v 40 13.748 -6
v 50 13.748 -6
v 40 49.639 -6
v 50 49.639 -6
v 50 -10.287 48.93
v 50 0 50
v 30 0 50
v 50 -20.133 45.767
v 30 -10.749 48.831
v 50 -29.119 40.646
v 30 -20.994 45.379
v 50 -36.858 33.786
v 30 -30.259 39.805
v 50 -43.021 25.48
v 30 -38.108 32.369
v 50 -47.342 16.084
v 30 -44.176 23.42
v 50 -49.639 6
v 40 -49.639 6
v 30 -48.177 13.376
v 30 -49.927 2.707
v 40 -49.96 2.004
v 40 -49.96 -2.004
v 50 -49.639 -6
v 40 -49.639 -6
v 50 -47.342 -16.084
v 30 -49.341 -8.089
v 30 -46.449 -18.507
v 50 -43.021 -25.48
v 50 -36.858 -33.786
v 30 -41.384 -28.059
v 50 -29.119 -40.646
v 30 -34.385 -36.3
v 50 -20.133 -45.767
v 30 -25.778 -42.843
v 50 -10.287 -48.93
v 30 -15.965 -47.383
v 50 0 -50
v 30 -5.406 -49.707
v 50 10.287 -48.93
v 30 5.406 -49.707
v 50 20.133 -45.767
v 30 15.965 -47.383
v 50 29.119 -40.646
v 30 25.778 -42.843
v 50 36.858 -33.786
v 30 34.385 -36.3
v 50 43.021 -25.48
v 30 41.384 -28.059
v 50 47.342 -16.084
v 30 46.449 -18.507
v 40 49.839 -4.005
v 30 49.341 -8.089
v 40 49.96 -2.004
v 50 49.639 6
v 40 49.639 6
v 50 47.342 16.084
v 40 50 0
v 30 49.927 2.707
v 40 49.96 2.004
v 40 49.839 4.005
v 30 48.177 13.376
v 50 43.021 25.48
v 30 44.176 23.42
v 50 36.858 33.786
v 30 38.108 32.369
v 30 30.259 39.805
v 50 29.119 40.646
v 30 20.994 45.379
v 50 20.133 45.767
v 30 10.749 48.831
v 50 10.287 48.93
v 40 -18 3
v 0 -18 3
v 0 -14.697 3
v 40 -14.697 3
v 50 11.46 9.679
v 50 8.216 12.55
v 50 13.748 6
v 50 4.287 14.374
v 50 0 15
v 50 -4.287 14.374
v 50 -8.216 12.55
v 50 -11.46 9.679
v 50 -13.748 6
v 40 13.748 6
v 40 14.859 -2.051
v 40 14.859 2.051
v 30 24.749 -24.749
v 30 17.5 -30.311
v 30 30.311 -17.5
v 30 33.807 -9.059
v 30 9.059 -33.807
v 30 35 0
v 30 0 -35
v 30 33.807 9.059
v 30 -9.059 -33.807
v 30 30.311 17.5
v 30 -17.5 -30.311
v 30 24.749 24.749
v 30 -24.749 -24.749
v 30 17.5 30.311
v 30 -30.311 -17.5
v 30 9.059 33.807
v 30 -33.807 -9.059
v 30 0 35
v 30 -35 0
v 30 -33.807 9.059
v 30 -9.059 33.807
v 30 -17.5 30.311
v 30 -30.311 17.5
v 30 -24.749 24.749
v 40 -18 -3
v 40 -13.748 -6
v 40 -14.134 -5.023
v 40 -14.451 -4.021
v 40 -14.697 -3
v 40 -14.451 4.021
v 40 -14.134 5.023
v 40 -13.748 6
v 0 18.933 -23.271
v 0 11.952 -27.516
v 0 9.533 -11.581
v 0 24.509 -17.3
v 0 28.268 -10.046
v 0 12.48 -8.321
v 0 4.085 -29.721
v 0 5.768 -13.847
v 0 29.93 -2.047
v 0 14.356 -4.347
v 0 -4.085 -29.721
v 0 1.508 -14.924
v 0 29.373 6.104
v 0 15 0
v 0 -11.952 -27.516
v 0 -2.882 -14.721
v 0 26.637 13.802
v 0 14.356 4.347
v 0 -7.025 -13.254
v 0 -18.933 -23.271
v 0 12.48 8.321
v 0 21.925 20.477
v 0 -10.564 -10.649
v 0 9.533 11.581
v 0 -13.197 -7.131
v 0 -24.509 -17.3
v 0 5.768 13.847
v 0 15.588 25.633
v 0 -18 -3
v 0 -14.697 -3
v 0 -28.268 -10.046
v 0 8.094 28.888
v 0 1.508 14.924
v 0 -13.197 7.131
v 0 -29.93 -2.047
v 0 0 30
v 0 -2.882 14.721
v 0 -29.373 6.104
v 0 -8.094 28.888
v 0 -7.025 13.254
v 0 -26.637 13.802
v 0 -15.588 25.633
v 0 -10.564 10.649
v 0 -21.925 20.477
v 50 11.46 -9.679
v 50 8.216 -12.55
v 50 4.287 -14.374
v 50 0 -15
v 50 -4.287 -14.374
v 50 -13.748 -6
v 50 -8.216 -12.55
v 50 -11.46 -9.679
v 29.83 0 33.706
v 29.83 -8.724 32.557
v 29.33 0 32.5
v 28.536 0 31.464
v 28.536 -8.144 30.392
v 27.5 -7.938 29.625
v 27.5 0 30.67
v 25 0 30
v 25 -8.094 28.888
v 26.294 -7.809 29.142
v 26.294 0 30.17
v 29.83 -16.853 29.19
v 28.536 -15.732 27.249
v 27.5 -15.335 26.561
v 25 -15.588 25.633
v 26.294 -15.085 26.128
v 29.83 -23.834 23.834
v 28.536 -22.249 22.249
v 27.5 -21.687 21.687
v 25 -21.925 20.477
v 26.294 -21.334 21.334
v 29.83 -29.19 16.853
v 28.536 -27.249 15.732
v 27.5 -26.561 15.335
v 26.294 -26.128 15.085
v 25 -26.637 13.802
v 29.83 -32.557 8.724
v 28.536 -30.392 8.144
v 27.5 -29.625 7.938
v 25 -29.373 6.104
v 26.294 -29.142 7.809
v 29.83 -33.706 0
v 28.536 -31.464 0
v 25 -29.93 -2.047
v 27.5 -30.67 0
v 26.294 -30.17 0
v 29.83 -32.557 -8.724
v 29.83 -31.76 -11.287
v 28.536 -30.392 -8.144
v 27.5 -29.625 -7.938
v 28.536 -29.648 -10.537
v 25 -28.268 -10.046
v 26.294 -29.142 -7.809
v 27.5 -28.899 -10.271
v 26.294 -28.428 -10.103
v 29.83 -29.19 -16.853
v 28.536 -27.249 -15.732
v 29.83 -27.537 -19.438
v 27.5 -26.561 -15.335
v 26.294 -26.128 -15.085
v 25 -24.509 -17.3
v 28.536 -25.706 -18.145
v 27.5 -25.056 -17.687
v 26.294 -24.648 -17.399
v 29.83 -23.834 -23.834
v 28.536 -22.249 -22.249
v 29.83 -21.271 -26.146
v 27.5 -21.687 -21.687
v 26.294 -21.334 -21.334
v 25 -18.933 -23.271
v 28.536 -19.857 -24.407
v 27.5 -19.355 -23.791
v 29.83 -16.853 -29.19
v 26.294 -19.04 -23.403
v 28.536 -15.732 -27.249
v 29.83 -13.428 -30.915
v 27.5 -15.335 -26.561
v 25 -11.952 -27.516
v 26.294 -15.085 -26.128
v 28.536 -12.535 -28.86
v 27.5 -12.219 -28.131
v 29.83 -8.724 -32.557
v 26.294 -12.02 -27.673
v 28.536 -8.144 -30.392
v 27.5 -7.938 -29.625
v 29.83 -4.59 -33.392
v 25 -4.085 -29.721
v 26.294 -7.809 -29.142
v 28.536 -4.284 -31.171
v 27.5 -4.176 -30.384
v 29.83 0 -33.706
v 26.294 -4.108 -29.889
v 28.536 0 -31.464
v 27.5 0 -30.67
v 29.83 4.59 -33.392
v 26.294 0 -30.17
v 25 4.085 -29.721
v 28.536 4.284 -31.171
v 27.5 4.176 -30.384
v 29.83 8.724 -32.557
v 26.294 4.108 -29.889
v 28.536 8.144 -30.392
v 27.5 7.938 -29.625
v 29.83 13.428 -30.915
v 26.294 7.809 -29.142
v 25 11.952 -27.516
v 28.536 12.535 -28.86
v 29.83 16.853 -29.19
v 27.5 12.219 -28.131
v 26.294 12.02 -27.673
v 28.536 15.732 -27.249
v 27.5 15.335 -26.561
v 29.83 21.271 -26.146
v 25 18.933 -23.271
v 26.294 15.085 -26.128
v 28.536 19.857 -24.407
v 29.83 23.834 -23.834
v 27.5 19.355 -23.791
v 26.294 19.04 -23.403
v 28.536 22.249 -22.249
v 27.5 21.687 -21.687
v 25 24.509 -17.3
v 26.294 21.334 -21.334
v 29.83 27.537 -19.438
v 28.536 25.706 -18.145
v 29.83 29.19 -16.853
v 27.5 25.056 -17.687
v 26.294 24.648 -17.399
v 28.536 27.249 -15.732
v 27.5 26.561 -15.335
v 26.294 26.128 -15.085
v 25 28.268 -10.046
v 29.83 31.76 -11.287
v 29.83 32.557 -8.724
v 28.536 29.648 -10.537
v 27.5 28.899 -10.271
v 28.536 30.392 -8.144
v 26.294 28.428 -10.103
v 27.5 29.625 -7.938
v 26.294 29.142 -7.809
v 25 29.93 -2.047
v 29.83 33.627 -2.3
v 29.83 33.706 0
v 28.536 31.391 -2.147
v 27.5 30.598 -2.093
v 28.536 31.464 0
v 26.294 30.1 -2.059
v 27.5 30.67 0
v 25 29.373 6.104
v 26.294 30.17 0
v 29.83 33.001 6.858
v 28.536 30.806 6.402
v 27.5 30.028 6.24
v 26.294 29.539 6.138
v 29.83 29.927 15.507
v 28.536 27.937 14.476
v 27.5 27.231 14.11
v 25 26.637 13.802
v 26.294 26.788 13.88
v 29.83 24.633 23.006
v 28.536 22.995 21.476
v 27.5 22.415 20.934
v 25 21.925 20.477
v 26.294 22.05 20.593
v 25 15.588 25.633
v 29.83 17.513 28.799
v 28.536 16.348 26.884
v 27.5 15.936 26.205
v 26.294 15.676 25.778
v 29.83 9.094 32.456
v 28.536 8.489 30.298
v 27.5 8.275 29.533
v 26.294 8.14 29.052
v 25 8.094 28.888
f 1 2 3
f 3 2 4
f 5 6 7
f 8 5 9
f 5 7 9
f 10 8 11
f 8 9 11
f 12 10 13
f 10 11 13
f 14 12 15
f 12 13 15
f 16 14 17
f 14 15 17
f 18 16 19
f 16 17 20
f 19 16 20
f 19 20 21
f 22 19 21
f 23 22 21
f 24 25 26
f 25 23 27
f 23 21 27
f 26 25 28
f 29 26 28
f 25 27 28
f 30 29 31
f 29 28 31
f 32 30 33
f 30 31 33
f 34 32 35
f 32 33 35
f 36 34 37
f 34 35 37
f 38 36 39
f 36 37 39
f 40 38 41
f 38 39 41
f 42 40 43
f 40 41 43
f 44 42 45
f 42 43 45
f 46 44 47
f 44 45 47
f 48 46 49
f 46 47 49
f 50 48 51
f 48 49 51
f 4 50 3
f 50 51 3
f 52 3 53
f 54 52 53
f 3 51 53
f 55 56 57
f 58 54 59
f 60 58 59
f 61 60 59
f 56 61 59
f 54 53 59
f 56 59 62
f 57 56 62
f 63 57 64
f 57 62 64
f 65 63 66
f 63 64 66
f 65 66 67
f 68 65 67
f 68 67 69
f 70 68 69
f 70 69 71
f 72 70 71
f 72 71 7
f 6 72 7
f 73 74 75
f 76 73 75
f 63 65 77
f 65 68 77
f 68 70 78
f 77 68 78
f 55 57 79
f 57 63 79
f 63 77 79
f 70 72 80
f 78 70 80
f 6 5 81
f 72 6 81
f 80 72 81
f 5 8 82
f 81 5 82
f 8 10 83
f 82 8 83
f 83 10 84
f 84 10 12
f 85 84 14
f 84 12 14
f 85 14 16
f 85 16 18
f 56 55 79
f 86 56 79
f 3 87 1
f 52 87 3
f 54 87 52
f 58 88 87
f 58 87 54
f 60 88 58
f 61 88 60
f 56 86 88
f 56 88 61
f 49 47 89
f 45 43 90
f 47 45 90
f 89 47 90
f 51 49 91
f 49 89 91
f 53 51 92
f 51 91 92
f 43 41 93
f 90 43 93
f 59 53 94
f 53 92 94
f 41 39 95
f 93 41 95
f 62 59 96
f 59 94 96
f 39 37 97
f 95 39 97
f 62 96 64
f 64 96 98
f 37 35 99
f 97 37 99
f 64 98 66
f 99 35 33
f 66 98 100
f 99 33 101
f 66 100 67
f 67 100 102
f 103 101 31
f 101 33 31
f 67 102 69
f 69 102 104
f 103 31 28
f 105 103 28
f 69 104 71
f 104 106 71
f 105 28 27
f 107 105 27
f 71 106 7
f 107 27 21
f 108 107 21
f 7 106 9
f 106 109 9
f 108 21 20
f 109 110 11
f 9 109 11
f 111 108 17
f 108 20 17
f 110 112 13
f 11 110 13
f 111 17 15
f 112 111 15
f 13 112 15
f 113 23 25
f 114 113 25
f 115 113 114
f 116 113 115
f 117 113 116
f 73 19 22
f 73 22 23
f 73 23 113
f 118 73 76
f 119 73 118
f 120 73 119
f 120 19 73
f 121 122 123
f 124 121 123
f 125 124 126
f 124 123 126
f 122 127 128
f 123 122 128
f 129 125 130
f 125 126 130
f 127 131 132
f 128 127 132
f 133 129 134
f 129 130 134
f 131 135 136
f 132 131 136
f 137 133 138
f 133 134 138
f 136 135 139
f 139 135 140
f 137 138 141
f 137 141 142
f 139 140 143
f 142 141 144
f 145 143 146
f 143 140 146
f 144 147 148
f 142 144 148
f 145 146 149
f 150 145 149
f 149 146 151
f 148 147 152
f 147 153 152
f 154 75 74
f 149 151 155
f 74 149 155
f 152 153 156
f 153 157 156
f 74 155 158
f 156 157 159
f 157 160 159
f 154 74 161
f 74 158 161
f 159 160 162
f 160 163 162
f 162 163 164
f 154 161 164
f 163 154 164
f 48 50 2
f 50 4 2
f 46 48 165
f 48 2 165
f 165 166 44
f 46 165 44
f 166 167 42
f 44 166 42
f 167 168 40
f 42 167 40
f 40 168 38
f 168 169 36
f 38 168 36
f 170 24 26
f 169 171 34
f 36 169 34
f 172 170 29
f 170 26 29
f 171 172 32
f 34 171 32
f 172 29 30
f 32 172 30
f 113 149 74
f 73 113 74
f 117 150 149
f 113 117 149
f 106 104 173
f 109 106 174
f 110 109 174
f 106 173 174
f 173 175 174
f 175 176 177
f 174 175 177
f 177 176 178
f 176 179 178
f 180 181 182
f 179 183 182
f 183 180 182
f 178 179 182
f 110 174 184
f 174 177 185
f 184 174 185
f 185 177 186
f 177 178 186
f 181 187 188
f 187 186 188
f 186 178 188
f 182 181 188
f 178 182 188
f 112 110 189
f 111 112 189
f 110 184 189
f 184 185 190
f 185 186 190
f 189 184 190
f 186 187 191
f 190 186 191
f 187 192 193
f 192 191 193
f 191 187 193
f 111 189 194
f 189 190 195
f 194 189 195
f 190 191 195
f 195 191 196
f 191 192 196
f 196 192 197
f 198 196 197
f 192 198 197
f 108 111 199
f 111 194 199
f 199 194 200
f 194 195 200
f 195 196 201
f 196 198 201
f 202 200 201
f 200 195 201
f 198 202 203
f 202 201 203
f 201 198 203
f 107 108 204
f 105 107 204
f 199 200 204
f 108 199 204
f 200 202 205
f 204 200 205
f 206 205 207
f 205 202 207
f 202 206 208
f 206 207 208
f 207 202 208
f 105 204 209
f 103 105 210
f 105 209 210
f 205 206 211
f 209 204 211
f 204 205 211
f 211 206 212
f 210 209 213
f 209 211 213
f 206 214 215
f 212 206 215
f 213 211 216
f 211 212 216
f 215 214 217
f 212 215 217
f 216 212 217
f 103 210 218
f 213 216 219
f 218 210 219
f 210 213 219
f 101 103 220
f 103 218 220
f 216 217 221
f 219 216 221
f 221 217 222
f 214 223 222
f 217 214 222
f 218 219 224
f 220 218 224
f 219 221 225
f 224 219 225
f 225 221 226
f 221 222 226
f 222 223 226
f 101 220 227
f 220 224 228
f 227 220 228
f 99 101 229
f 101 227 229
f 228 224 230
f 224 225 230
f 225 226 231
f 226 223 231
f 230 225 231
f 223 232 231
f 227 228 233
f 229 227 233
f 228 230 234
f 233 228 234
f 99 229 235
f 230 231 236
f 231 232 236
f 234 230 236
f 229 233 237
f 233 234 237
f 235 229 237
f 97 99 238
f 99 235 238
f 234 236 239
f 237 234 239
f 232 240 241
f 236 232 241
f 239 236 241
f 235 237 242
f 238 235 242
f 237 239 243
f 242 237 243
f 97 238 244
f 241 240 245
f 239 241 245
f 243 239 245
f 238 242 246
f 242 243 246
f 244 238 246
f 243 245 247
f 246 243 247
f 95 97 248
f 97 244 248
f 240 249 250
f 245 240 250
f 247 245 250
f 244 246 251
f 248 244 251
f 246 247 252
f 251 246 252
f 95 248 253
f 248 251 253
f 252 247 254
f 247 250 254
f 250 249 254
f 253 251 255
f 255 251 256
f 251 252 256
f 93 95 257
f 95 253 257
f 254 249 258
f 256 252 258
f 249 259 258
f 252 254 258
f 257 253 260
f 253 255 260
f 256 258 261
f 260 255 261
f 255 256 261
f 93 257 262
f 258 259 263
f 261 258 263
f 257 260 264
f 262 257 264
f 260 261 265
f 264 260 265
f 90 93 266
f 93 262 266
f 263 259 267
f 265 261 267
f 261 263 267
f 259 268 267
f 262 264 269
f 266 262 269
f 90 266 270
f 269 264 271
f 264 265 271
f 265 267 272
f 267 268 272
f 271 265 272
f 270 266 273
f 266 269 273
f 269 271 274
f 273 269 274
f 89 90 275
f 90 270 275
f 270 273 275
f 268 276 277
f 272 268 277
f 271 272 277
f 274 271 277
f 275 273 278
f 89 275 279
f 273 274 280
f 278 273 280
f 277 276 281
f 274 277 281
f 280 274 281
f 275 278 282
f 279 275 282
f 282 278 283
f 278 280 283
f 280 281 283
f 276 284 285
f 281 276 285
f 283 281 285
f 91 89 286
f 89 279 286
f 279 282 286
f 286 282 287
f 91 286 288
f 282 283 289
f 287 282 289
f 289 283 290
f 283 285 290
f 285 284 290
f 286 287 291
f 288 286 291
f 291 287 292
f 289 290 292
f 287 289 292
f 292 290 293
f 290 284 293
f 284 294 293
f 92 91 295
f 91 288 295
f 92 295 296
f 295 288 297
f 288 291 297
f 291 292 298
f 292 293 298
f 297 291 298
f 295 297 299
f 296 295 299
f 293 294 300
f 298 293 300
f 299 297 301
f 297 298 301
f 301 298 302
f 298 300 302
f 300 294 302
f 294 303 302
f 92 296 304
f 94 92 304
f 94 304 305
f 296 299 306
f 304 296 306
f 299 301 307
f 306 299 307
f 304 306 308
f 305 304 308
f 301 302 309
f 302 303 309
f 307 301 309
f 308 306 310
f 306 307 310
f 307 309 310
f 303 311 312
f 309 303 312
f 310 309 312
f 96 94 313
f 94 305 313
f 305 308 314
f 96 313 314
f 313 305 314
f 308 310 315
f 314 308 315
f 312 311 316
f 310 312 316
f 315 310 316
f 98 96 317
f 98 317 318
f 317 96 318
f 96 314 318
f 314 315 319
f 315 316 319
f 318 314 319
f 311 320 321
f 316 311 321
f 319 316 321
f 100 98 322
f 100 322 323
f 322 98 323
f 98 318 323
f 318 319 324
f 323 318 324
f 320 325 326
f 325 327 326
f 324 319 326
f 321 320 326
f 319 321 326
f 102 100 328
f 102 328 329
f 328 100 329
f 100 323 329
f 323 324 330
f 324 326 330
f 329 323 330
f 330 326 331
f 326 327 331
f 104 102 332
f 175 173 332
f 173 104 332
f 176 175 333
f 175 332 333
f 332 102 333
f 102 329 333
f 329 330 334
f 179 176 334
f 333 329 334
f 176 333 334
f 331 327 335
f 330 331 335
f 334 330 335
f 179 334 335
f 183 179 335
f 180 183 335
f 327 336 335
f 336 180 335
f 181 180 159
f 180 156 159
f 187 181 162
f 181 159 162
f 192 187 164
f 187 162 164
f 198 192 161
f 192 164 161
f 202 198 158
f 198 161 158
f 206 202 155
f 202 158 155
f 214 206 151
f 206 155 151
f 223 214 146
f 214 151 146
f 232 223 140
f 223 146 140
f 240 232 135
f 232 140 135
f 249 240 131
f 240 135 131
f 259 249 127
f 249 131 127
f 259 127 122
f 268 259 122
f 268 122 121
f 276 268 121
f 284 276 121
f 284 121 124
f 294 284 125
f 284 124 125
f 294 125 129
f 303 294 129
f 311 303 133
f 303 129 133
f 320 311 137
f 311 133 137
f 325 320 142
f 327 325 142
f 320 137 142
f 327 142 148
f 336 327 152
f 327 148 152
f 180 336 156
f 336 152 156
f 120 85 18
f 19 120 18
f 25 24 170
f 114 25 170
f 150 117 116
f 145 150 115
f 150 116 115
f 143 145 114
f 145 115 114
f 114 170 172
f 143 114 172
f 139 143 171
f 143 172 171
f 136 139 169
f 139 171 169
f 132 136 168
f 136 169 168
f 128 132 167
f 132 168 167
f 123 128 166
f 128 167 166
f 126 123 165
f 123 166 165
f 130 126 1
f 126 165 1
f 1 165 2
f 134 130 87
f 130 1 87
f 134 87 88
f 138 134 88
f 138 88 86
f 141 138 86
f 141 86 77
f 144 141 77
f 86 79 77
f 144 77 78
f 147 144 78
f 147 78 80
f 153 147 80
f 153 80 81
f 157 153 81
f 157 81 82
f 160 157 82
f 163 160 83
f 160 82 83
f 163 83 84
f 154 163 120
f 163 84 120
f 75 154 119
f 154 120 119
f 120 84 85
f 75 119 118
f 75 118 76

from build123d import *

# Parameters (mm, degrees)
F3_DEPTH = 50
F5_DEPTH = 10


with BuildPart() as f1:
    # F0 (on Front) → F1 (revolve)
    with BuildSketch(Plane.XZ):
        with BuildLine():
            Line((0, 30), (0, 15))
            Line((0, 15), (50, 15))
            Line((50, 15), (50, 50))
            Line((50, 50), (30, 50))
            Line((30, 50), (30, 35))
            ThreePointArc((30, 35), (28.5355339059, 31.4644660941), (25, 30))
            Line((25, 30), (0, 30))
        make_face()
    revolve(axis=Axis((18.1425, 0, 0), (1, 0, 0)))

    # F2 (on face) → F3 (cut)
    with BuildSketch(Plane(origin=(0, 0, 0), x_dir=(0, -1, 0), z_dir=(-1, 0, 0))):
        with BuildLine():
            ThreePointArc((15, 0), (14.9240422951, -1.5076344301), (14.6969384567, -3))
            Line((14.6969384567, -3), (18, -3))
            Line((18, -3), (18, 3))
            Line((18, 3), (14.6969384567, 3))
            ThreePointArc((14.6969384567, 3), (14.9240422951, 1.5076344301), (15, 0))
        make_face()
    extrude(amount=-F3_DEPTH, mode=Mode.SUBTRACT)

    # F4 (on face) → F5 (cut)
    with BuildSketch(Plane.YZ.offset(50)):
        with BuildLine():
            Line((-13.7477270849, 6), (-49.638694584, 6))
            ThreePointArc((-49.638694584, 6), (-50, 0), (-49.638694584, -6))
            Line((-49.638694584, -6), (-13.7477270849, -6))
            ThreePointArc((-13.7477270849, -6), (-14.3012149639, -4.5249586249), (-14.6969384567, -3))
            Line((-14.6969384567, -3), (-18, -3))
            Line((-18, -3), (-18, 3))
            Line((-18, 3), (-14.6969384567, 3))
            ThreePointArc((-14.6969384567, 3), (-14.3012149639, 4.5249586249), (-13.7477270849, 6))
        make_face()
        with BuildLine():
            ThreePointArc((50, 0), (49.9095919098, 3.0054343115), (49.638694584, 6))
            Line((49.638694584, 6), (13.7477270849, 6))
            ThreePointArc((13.7477270849, 6), (15, 0), (13.7477270849, -6))
            Line((13.7477270849, -6), (49.638694584, -6))
            ThreePointArc((49.638694584, -6), (49.9095919098, -3.0054343115), (50, 0))
        make_face()
    extrude(amount=-F5_DEPTH, mode=Mode.SUBTRACT)


solid = f1.part
